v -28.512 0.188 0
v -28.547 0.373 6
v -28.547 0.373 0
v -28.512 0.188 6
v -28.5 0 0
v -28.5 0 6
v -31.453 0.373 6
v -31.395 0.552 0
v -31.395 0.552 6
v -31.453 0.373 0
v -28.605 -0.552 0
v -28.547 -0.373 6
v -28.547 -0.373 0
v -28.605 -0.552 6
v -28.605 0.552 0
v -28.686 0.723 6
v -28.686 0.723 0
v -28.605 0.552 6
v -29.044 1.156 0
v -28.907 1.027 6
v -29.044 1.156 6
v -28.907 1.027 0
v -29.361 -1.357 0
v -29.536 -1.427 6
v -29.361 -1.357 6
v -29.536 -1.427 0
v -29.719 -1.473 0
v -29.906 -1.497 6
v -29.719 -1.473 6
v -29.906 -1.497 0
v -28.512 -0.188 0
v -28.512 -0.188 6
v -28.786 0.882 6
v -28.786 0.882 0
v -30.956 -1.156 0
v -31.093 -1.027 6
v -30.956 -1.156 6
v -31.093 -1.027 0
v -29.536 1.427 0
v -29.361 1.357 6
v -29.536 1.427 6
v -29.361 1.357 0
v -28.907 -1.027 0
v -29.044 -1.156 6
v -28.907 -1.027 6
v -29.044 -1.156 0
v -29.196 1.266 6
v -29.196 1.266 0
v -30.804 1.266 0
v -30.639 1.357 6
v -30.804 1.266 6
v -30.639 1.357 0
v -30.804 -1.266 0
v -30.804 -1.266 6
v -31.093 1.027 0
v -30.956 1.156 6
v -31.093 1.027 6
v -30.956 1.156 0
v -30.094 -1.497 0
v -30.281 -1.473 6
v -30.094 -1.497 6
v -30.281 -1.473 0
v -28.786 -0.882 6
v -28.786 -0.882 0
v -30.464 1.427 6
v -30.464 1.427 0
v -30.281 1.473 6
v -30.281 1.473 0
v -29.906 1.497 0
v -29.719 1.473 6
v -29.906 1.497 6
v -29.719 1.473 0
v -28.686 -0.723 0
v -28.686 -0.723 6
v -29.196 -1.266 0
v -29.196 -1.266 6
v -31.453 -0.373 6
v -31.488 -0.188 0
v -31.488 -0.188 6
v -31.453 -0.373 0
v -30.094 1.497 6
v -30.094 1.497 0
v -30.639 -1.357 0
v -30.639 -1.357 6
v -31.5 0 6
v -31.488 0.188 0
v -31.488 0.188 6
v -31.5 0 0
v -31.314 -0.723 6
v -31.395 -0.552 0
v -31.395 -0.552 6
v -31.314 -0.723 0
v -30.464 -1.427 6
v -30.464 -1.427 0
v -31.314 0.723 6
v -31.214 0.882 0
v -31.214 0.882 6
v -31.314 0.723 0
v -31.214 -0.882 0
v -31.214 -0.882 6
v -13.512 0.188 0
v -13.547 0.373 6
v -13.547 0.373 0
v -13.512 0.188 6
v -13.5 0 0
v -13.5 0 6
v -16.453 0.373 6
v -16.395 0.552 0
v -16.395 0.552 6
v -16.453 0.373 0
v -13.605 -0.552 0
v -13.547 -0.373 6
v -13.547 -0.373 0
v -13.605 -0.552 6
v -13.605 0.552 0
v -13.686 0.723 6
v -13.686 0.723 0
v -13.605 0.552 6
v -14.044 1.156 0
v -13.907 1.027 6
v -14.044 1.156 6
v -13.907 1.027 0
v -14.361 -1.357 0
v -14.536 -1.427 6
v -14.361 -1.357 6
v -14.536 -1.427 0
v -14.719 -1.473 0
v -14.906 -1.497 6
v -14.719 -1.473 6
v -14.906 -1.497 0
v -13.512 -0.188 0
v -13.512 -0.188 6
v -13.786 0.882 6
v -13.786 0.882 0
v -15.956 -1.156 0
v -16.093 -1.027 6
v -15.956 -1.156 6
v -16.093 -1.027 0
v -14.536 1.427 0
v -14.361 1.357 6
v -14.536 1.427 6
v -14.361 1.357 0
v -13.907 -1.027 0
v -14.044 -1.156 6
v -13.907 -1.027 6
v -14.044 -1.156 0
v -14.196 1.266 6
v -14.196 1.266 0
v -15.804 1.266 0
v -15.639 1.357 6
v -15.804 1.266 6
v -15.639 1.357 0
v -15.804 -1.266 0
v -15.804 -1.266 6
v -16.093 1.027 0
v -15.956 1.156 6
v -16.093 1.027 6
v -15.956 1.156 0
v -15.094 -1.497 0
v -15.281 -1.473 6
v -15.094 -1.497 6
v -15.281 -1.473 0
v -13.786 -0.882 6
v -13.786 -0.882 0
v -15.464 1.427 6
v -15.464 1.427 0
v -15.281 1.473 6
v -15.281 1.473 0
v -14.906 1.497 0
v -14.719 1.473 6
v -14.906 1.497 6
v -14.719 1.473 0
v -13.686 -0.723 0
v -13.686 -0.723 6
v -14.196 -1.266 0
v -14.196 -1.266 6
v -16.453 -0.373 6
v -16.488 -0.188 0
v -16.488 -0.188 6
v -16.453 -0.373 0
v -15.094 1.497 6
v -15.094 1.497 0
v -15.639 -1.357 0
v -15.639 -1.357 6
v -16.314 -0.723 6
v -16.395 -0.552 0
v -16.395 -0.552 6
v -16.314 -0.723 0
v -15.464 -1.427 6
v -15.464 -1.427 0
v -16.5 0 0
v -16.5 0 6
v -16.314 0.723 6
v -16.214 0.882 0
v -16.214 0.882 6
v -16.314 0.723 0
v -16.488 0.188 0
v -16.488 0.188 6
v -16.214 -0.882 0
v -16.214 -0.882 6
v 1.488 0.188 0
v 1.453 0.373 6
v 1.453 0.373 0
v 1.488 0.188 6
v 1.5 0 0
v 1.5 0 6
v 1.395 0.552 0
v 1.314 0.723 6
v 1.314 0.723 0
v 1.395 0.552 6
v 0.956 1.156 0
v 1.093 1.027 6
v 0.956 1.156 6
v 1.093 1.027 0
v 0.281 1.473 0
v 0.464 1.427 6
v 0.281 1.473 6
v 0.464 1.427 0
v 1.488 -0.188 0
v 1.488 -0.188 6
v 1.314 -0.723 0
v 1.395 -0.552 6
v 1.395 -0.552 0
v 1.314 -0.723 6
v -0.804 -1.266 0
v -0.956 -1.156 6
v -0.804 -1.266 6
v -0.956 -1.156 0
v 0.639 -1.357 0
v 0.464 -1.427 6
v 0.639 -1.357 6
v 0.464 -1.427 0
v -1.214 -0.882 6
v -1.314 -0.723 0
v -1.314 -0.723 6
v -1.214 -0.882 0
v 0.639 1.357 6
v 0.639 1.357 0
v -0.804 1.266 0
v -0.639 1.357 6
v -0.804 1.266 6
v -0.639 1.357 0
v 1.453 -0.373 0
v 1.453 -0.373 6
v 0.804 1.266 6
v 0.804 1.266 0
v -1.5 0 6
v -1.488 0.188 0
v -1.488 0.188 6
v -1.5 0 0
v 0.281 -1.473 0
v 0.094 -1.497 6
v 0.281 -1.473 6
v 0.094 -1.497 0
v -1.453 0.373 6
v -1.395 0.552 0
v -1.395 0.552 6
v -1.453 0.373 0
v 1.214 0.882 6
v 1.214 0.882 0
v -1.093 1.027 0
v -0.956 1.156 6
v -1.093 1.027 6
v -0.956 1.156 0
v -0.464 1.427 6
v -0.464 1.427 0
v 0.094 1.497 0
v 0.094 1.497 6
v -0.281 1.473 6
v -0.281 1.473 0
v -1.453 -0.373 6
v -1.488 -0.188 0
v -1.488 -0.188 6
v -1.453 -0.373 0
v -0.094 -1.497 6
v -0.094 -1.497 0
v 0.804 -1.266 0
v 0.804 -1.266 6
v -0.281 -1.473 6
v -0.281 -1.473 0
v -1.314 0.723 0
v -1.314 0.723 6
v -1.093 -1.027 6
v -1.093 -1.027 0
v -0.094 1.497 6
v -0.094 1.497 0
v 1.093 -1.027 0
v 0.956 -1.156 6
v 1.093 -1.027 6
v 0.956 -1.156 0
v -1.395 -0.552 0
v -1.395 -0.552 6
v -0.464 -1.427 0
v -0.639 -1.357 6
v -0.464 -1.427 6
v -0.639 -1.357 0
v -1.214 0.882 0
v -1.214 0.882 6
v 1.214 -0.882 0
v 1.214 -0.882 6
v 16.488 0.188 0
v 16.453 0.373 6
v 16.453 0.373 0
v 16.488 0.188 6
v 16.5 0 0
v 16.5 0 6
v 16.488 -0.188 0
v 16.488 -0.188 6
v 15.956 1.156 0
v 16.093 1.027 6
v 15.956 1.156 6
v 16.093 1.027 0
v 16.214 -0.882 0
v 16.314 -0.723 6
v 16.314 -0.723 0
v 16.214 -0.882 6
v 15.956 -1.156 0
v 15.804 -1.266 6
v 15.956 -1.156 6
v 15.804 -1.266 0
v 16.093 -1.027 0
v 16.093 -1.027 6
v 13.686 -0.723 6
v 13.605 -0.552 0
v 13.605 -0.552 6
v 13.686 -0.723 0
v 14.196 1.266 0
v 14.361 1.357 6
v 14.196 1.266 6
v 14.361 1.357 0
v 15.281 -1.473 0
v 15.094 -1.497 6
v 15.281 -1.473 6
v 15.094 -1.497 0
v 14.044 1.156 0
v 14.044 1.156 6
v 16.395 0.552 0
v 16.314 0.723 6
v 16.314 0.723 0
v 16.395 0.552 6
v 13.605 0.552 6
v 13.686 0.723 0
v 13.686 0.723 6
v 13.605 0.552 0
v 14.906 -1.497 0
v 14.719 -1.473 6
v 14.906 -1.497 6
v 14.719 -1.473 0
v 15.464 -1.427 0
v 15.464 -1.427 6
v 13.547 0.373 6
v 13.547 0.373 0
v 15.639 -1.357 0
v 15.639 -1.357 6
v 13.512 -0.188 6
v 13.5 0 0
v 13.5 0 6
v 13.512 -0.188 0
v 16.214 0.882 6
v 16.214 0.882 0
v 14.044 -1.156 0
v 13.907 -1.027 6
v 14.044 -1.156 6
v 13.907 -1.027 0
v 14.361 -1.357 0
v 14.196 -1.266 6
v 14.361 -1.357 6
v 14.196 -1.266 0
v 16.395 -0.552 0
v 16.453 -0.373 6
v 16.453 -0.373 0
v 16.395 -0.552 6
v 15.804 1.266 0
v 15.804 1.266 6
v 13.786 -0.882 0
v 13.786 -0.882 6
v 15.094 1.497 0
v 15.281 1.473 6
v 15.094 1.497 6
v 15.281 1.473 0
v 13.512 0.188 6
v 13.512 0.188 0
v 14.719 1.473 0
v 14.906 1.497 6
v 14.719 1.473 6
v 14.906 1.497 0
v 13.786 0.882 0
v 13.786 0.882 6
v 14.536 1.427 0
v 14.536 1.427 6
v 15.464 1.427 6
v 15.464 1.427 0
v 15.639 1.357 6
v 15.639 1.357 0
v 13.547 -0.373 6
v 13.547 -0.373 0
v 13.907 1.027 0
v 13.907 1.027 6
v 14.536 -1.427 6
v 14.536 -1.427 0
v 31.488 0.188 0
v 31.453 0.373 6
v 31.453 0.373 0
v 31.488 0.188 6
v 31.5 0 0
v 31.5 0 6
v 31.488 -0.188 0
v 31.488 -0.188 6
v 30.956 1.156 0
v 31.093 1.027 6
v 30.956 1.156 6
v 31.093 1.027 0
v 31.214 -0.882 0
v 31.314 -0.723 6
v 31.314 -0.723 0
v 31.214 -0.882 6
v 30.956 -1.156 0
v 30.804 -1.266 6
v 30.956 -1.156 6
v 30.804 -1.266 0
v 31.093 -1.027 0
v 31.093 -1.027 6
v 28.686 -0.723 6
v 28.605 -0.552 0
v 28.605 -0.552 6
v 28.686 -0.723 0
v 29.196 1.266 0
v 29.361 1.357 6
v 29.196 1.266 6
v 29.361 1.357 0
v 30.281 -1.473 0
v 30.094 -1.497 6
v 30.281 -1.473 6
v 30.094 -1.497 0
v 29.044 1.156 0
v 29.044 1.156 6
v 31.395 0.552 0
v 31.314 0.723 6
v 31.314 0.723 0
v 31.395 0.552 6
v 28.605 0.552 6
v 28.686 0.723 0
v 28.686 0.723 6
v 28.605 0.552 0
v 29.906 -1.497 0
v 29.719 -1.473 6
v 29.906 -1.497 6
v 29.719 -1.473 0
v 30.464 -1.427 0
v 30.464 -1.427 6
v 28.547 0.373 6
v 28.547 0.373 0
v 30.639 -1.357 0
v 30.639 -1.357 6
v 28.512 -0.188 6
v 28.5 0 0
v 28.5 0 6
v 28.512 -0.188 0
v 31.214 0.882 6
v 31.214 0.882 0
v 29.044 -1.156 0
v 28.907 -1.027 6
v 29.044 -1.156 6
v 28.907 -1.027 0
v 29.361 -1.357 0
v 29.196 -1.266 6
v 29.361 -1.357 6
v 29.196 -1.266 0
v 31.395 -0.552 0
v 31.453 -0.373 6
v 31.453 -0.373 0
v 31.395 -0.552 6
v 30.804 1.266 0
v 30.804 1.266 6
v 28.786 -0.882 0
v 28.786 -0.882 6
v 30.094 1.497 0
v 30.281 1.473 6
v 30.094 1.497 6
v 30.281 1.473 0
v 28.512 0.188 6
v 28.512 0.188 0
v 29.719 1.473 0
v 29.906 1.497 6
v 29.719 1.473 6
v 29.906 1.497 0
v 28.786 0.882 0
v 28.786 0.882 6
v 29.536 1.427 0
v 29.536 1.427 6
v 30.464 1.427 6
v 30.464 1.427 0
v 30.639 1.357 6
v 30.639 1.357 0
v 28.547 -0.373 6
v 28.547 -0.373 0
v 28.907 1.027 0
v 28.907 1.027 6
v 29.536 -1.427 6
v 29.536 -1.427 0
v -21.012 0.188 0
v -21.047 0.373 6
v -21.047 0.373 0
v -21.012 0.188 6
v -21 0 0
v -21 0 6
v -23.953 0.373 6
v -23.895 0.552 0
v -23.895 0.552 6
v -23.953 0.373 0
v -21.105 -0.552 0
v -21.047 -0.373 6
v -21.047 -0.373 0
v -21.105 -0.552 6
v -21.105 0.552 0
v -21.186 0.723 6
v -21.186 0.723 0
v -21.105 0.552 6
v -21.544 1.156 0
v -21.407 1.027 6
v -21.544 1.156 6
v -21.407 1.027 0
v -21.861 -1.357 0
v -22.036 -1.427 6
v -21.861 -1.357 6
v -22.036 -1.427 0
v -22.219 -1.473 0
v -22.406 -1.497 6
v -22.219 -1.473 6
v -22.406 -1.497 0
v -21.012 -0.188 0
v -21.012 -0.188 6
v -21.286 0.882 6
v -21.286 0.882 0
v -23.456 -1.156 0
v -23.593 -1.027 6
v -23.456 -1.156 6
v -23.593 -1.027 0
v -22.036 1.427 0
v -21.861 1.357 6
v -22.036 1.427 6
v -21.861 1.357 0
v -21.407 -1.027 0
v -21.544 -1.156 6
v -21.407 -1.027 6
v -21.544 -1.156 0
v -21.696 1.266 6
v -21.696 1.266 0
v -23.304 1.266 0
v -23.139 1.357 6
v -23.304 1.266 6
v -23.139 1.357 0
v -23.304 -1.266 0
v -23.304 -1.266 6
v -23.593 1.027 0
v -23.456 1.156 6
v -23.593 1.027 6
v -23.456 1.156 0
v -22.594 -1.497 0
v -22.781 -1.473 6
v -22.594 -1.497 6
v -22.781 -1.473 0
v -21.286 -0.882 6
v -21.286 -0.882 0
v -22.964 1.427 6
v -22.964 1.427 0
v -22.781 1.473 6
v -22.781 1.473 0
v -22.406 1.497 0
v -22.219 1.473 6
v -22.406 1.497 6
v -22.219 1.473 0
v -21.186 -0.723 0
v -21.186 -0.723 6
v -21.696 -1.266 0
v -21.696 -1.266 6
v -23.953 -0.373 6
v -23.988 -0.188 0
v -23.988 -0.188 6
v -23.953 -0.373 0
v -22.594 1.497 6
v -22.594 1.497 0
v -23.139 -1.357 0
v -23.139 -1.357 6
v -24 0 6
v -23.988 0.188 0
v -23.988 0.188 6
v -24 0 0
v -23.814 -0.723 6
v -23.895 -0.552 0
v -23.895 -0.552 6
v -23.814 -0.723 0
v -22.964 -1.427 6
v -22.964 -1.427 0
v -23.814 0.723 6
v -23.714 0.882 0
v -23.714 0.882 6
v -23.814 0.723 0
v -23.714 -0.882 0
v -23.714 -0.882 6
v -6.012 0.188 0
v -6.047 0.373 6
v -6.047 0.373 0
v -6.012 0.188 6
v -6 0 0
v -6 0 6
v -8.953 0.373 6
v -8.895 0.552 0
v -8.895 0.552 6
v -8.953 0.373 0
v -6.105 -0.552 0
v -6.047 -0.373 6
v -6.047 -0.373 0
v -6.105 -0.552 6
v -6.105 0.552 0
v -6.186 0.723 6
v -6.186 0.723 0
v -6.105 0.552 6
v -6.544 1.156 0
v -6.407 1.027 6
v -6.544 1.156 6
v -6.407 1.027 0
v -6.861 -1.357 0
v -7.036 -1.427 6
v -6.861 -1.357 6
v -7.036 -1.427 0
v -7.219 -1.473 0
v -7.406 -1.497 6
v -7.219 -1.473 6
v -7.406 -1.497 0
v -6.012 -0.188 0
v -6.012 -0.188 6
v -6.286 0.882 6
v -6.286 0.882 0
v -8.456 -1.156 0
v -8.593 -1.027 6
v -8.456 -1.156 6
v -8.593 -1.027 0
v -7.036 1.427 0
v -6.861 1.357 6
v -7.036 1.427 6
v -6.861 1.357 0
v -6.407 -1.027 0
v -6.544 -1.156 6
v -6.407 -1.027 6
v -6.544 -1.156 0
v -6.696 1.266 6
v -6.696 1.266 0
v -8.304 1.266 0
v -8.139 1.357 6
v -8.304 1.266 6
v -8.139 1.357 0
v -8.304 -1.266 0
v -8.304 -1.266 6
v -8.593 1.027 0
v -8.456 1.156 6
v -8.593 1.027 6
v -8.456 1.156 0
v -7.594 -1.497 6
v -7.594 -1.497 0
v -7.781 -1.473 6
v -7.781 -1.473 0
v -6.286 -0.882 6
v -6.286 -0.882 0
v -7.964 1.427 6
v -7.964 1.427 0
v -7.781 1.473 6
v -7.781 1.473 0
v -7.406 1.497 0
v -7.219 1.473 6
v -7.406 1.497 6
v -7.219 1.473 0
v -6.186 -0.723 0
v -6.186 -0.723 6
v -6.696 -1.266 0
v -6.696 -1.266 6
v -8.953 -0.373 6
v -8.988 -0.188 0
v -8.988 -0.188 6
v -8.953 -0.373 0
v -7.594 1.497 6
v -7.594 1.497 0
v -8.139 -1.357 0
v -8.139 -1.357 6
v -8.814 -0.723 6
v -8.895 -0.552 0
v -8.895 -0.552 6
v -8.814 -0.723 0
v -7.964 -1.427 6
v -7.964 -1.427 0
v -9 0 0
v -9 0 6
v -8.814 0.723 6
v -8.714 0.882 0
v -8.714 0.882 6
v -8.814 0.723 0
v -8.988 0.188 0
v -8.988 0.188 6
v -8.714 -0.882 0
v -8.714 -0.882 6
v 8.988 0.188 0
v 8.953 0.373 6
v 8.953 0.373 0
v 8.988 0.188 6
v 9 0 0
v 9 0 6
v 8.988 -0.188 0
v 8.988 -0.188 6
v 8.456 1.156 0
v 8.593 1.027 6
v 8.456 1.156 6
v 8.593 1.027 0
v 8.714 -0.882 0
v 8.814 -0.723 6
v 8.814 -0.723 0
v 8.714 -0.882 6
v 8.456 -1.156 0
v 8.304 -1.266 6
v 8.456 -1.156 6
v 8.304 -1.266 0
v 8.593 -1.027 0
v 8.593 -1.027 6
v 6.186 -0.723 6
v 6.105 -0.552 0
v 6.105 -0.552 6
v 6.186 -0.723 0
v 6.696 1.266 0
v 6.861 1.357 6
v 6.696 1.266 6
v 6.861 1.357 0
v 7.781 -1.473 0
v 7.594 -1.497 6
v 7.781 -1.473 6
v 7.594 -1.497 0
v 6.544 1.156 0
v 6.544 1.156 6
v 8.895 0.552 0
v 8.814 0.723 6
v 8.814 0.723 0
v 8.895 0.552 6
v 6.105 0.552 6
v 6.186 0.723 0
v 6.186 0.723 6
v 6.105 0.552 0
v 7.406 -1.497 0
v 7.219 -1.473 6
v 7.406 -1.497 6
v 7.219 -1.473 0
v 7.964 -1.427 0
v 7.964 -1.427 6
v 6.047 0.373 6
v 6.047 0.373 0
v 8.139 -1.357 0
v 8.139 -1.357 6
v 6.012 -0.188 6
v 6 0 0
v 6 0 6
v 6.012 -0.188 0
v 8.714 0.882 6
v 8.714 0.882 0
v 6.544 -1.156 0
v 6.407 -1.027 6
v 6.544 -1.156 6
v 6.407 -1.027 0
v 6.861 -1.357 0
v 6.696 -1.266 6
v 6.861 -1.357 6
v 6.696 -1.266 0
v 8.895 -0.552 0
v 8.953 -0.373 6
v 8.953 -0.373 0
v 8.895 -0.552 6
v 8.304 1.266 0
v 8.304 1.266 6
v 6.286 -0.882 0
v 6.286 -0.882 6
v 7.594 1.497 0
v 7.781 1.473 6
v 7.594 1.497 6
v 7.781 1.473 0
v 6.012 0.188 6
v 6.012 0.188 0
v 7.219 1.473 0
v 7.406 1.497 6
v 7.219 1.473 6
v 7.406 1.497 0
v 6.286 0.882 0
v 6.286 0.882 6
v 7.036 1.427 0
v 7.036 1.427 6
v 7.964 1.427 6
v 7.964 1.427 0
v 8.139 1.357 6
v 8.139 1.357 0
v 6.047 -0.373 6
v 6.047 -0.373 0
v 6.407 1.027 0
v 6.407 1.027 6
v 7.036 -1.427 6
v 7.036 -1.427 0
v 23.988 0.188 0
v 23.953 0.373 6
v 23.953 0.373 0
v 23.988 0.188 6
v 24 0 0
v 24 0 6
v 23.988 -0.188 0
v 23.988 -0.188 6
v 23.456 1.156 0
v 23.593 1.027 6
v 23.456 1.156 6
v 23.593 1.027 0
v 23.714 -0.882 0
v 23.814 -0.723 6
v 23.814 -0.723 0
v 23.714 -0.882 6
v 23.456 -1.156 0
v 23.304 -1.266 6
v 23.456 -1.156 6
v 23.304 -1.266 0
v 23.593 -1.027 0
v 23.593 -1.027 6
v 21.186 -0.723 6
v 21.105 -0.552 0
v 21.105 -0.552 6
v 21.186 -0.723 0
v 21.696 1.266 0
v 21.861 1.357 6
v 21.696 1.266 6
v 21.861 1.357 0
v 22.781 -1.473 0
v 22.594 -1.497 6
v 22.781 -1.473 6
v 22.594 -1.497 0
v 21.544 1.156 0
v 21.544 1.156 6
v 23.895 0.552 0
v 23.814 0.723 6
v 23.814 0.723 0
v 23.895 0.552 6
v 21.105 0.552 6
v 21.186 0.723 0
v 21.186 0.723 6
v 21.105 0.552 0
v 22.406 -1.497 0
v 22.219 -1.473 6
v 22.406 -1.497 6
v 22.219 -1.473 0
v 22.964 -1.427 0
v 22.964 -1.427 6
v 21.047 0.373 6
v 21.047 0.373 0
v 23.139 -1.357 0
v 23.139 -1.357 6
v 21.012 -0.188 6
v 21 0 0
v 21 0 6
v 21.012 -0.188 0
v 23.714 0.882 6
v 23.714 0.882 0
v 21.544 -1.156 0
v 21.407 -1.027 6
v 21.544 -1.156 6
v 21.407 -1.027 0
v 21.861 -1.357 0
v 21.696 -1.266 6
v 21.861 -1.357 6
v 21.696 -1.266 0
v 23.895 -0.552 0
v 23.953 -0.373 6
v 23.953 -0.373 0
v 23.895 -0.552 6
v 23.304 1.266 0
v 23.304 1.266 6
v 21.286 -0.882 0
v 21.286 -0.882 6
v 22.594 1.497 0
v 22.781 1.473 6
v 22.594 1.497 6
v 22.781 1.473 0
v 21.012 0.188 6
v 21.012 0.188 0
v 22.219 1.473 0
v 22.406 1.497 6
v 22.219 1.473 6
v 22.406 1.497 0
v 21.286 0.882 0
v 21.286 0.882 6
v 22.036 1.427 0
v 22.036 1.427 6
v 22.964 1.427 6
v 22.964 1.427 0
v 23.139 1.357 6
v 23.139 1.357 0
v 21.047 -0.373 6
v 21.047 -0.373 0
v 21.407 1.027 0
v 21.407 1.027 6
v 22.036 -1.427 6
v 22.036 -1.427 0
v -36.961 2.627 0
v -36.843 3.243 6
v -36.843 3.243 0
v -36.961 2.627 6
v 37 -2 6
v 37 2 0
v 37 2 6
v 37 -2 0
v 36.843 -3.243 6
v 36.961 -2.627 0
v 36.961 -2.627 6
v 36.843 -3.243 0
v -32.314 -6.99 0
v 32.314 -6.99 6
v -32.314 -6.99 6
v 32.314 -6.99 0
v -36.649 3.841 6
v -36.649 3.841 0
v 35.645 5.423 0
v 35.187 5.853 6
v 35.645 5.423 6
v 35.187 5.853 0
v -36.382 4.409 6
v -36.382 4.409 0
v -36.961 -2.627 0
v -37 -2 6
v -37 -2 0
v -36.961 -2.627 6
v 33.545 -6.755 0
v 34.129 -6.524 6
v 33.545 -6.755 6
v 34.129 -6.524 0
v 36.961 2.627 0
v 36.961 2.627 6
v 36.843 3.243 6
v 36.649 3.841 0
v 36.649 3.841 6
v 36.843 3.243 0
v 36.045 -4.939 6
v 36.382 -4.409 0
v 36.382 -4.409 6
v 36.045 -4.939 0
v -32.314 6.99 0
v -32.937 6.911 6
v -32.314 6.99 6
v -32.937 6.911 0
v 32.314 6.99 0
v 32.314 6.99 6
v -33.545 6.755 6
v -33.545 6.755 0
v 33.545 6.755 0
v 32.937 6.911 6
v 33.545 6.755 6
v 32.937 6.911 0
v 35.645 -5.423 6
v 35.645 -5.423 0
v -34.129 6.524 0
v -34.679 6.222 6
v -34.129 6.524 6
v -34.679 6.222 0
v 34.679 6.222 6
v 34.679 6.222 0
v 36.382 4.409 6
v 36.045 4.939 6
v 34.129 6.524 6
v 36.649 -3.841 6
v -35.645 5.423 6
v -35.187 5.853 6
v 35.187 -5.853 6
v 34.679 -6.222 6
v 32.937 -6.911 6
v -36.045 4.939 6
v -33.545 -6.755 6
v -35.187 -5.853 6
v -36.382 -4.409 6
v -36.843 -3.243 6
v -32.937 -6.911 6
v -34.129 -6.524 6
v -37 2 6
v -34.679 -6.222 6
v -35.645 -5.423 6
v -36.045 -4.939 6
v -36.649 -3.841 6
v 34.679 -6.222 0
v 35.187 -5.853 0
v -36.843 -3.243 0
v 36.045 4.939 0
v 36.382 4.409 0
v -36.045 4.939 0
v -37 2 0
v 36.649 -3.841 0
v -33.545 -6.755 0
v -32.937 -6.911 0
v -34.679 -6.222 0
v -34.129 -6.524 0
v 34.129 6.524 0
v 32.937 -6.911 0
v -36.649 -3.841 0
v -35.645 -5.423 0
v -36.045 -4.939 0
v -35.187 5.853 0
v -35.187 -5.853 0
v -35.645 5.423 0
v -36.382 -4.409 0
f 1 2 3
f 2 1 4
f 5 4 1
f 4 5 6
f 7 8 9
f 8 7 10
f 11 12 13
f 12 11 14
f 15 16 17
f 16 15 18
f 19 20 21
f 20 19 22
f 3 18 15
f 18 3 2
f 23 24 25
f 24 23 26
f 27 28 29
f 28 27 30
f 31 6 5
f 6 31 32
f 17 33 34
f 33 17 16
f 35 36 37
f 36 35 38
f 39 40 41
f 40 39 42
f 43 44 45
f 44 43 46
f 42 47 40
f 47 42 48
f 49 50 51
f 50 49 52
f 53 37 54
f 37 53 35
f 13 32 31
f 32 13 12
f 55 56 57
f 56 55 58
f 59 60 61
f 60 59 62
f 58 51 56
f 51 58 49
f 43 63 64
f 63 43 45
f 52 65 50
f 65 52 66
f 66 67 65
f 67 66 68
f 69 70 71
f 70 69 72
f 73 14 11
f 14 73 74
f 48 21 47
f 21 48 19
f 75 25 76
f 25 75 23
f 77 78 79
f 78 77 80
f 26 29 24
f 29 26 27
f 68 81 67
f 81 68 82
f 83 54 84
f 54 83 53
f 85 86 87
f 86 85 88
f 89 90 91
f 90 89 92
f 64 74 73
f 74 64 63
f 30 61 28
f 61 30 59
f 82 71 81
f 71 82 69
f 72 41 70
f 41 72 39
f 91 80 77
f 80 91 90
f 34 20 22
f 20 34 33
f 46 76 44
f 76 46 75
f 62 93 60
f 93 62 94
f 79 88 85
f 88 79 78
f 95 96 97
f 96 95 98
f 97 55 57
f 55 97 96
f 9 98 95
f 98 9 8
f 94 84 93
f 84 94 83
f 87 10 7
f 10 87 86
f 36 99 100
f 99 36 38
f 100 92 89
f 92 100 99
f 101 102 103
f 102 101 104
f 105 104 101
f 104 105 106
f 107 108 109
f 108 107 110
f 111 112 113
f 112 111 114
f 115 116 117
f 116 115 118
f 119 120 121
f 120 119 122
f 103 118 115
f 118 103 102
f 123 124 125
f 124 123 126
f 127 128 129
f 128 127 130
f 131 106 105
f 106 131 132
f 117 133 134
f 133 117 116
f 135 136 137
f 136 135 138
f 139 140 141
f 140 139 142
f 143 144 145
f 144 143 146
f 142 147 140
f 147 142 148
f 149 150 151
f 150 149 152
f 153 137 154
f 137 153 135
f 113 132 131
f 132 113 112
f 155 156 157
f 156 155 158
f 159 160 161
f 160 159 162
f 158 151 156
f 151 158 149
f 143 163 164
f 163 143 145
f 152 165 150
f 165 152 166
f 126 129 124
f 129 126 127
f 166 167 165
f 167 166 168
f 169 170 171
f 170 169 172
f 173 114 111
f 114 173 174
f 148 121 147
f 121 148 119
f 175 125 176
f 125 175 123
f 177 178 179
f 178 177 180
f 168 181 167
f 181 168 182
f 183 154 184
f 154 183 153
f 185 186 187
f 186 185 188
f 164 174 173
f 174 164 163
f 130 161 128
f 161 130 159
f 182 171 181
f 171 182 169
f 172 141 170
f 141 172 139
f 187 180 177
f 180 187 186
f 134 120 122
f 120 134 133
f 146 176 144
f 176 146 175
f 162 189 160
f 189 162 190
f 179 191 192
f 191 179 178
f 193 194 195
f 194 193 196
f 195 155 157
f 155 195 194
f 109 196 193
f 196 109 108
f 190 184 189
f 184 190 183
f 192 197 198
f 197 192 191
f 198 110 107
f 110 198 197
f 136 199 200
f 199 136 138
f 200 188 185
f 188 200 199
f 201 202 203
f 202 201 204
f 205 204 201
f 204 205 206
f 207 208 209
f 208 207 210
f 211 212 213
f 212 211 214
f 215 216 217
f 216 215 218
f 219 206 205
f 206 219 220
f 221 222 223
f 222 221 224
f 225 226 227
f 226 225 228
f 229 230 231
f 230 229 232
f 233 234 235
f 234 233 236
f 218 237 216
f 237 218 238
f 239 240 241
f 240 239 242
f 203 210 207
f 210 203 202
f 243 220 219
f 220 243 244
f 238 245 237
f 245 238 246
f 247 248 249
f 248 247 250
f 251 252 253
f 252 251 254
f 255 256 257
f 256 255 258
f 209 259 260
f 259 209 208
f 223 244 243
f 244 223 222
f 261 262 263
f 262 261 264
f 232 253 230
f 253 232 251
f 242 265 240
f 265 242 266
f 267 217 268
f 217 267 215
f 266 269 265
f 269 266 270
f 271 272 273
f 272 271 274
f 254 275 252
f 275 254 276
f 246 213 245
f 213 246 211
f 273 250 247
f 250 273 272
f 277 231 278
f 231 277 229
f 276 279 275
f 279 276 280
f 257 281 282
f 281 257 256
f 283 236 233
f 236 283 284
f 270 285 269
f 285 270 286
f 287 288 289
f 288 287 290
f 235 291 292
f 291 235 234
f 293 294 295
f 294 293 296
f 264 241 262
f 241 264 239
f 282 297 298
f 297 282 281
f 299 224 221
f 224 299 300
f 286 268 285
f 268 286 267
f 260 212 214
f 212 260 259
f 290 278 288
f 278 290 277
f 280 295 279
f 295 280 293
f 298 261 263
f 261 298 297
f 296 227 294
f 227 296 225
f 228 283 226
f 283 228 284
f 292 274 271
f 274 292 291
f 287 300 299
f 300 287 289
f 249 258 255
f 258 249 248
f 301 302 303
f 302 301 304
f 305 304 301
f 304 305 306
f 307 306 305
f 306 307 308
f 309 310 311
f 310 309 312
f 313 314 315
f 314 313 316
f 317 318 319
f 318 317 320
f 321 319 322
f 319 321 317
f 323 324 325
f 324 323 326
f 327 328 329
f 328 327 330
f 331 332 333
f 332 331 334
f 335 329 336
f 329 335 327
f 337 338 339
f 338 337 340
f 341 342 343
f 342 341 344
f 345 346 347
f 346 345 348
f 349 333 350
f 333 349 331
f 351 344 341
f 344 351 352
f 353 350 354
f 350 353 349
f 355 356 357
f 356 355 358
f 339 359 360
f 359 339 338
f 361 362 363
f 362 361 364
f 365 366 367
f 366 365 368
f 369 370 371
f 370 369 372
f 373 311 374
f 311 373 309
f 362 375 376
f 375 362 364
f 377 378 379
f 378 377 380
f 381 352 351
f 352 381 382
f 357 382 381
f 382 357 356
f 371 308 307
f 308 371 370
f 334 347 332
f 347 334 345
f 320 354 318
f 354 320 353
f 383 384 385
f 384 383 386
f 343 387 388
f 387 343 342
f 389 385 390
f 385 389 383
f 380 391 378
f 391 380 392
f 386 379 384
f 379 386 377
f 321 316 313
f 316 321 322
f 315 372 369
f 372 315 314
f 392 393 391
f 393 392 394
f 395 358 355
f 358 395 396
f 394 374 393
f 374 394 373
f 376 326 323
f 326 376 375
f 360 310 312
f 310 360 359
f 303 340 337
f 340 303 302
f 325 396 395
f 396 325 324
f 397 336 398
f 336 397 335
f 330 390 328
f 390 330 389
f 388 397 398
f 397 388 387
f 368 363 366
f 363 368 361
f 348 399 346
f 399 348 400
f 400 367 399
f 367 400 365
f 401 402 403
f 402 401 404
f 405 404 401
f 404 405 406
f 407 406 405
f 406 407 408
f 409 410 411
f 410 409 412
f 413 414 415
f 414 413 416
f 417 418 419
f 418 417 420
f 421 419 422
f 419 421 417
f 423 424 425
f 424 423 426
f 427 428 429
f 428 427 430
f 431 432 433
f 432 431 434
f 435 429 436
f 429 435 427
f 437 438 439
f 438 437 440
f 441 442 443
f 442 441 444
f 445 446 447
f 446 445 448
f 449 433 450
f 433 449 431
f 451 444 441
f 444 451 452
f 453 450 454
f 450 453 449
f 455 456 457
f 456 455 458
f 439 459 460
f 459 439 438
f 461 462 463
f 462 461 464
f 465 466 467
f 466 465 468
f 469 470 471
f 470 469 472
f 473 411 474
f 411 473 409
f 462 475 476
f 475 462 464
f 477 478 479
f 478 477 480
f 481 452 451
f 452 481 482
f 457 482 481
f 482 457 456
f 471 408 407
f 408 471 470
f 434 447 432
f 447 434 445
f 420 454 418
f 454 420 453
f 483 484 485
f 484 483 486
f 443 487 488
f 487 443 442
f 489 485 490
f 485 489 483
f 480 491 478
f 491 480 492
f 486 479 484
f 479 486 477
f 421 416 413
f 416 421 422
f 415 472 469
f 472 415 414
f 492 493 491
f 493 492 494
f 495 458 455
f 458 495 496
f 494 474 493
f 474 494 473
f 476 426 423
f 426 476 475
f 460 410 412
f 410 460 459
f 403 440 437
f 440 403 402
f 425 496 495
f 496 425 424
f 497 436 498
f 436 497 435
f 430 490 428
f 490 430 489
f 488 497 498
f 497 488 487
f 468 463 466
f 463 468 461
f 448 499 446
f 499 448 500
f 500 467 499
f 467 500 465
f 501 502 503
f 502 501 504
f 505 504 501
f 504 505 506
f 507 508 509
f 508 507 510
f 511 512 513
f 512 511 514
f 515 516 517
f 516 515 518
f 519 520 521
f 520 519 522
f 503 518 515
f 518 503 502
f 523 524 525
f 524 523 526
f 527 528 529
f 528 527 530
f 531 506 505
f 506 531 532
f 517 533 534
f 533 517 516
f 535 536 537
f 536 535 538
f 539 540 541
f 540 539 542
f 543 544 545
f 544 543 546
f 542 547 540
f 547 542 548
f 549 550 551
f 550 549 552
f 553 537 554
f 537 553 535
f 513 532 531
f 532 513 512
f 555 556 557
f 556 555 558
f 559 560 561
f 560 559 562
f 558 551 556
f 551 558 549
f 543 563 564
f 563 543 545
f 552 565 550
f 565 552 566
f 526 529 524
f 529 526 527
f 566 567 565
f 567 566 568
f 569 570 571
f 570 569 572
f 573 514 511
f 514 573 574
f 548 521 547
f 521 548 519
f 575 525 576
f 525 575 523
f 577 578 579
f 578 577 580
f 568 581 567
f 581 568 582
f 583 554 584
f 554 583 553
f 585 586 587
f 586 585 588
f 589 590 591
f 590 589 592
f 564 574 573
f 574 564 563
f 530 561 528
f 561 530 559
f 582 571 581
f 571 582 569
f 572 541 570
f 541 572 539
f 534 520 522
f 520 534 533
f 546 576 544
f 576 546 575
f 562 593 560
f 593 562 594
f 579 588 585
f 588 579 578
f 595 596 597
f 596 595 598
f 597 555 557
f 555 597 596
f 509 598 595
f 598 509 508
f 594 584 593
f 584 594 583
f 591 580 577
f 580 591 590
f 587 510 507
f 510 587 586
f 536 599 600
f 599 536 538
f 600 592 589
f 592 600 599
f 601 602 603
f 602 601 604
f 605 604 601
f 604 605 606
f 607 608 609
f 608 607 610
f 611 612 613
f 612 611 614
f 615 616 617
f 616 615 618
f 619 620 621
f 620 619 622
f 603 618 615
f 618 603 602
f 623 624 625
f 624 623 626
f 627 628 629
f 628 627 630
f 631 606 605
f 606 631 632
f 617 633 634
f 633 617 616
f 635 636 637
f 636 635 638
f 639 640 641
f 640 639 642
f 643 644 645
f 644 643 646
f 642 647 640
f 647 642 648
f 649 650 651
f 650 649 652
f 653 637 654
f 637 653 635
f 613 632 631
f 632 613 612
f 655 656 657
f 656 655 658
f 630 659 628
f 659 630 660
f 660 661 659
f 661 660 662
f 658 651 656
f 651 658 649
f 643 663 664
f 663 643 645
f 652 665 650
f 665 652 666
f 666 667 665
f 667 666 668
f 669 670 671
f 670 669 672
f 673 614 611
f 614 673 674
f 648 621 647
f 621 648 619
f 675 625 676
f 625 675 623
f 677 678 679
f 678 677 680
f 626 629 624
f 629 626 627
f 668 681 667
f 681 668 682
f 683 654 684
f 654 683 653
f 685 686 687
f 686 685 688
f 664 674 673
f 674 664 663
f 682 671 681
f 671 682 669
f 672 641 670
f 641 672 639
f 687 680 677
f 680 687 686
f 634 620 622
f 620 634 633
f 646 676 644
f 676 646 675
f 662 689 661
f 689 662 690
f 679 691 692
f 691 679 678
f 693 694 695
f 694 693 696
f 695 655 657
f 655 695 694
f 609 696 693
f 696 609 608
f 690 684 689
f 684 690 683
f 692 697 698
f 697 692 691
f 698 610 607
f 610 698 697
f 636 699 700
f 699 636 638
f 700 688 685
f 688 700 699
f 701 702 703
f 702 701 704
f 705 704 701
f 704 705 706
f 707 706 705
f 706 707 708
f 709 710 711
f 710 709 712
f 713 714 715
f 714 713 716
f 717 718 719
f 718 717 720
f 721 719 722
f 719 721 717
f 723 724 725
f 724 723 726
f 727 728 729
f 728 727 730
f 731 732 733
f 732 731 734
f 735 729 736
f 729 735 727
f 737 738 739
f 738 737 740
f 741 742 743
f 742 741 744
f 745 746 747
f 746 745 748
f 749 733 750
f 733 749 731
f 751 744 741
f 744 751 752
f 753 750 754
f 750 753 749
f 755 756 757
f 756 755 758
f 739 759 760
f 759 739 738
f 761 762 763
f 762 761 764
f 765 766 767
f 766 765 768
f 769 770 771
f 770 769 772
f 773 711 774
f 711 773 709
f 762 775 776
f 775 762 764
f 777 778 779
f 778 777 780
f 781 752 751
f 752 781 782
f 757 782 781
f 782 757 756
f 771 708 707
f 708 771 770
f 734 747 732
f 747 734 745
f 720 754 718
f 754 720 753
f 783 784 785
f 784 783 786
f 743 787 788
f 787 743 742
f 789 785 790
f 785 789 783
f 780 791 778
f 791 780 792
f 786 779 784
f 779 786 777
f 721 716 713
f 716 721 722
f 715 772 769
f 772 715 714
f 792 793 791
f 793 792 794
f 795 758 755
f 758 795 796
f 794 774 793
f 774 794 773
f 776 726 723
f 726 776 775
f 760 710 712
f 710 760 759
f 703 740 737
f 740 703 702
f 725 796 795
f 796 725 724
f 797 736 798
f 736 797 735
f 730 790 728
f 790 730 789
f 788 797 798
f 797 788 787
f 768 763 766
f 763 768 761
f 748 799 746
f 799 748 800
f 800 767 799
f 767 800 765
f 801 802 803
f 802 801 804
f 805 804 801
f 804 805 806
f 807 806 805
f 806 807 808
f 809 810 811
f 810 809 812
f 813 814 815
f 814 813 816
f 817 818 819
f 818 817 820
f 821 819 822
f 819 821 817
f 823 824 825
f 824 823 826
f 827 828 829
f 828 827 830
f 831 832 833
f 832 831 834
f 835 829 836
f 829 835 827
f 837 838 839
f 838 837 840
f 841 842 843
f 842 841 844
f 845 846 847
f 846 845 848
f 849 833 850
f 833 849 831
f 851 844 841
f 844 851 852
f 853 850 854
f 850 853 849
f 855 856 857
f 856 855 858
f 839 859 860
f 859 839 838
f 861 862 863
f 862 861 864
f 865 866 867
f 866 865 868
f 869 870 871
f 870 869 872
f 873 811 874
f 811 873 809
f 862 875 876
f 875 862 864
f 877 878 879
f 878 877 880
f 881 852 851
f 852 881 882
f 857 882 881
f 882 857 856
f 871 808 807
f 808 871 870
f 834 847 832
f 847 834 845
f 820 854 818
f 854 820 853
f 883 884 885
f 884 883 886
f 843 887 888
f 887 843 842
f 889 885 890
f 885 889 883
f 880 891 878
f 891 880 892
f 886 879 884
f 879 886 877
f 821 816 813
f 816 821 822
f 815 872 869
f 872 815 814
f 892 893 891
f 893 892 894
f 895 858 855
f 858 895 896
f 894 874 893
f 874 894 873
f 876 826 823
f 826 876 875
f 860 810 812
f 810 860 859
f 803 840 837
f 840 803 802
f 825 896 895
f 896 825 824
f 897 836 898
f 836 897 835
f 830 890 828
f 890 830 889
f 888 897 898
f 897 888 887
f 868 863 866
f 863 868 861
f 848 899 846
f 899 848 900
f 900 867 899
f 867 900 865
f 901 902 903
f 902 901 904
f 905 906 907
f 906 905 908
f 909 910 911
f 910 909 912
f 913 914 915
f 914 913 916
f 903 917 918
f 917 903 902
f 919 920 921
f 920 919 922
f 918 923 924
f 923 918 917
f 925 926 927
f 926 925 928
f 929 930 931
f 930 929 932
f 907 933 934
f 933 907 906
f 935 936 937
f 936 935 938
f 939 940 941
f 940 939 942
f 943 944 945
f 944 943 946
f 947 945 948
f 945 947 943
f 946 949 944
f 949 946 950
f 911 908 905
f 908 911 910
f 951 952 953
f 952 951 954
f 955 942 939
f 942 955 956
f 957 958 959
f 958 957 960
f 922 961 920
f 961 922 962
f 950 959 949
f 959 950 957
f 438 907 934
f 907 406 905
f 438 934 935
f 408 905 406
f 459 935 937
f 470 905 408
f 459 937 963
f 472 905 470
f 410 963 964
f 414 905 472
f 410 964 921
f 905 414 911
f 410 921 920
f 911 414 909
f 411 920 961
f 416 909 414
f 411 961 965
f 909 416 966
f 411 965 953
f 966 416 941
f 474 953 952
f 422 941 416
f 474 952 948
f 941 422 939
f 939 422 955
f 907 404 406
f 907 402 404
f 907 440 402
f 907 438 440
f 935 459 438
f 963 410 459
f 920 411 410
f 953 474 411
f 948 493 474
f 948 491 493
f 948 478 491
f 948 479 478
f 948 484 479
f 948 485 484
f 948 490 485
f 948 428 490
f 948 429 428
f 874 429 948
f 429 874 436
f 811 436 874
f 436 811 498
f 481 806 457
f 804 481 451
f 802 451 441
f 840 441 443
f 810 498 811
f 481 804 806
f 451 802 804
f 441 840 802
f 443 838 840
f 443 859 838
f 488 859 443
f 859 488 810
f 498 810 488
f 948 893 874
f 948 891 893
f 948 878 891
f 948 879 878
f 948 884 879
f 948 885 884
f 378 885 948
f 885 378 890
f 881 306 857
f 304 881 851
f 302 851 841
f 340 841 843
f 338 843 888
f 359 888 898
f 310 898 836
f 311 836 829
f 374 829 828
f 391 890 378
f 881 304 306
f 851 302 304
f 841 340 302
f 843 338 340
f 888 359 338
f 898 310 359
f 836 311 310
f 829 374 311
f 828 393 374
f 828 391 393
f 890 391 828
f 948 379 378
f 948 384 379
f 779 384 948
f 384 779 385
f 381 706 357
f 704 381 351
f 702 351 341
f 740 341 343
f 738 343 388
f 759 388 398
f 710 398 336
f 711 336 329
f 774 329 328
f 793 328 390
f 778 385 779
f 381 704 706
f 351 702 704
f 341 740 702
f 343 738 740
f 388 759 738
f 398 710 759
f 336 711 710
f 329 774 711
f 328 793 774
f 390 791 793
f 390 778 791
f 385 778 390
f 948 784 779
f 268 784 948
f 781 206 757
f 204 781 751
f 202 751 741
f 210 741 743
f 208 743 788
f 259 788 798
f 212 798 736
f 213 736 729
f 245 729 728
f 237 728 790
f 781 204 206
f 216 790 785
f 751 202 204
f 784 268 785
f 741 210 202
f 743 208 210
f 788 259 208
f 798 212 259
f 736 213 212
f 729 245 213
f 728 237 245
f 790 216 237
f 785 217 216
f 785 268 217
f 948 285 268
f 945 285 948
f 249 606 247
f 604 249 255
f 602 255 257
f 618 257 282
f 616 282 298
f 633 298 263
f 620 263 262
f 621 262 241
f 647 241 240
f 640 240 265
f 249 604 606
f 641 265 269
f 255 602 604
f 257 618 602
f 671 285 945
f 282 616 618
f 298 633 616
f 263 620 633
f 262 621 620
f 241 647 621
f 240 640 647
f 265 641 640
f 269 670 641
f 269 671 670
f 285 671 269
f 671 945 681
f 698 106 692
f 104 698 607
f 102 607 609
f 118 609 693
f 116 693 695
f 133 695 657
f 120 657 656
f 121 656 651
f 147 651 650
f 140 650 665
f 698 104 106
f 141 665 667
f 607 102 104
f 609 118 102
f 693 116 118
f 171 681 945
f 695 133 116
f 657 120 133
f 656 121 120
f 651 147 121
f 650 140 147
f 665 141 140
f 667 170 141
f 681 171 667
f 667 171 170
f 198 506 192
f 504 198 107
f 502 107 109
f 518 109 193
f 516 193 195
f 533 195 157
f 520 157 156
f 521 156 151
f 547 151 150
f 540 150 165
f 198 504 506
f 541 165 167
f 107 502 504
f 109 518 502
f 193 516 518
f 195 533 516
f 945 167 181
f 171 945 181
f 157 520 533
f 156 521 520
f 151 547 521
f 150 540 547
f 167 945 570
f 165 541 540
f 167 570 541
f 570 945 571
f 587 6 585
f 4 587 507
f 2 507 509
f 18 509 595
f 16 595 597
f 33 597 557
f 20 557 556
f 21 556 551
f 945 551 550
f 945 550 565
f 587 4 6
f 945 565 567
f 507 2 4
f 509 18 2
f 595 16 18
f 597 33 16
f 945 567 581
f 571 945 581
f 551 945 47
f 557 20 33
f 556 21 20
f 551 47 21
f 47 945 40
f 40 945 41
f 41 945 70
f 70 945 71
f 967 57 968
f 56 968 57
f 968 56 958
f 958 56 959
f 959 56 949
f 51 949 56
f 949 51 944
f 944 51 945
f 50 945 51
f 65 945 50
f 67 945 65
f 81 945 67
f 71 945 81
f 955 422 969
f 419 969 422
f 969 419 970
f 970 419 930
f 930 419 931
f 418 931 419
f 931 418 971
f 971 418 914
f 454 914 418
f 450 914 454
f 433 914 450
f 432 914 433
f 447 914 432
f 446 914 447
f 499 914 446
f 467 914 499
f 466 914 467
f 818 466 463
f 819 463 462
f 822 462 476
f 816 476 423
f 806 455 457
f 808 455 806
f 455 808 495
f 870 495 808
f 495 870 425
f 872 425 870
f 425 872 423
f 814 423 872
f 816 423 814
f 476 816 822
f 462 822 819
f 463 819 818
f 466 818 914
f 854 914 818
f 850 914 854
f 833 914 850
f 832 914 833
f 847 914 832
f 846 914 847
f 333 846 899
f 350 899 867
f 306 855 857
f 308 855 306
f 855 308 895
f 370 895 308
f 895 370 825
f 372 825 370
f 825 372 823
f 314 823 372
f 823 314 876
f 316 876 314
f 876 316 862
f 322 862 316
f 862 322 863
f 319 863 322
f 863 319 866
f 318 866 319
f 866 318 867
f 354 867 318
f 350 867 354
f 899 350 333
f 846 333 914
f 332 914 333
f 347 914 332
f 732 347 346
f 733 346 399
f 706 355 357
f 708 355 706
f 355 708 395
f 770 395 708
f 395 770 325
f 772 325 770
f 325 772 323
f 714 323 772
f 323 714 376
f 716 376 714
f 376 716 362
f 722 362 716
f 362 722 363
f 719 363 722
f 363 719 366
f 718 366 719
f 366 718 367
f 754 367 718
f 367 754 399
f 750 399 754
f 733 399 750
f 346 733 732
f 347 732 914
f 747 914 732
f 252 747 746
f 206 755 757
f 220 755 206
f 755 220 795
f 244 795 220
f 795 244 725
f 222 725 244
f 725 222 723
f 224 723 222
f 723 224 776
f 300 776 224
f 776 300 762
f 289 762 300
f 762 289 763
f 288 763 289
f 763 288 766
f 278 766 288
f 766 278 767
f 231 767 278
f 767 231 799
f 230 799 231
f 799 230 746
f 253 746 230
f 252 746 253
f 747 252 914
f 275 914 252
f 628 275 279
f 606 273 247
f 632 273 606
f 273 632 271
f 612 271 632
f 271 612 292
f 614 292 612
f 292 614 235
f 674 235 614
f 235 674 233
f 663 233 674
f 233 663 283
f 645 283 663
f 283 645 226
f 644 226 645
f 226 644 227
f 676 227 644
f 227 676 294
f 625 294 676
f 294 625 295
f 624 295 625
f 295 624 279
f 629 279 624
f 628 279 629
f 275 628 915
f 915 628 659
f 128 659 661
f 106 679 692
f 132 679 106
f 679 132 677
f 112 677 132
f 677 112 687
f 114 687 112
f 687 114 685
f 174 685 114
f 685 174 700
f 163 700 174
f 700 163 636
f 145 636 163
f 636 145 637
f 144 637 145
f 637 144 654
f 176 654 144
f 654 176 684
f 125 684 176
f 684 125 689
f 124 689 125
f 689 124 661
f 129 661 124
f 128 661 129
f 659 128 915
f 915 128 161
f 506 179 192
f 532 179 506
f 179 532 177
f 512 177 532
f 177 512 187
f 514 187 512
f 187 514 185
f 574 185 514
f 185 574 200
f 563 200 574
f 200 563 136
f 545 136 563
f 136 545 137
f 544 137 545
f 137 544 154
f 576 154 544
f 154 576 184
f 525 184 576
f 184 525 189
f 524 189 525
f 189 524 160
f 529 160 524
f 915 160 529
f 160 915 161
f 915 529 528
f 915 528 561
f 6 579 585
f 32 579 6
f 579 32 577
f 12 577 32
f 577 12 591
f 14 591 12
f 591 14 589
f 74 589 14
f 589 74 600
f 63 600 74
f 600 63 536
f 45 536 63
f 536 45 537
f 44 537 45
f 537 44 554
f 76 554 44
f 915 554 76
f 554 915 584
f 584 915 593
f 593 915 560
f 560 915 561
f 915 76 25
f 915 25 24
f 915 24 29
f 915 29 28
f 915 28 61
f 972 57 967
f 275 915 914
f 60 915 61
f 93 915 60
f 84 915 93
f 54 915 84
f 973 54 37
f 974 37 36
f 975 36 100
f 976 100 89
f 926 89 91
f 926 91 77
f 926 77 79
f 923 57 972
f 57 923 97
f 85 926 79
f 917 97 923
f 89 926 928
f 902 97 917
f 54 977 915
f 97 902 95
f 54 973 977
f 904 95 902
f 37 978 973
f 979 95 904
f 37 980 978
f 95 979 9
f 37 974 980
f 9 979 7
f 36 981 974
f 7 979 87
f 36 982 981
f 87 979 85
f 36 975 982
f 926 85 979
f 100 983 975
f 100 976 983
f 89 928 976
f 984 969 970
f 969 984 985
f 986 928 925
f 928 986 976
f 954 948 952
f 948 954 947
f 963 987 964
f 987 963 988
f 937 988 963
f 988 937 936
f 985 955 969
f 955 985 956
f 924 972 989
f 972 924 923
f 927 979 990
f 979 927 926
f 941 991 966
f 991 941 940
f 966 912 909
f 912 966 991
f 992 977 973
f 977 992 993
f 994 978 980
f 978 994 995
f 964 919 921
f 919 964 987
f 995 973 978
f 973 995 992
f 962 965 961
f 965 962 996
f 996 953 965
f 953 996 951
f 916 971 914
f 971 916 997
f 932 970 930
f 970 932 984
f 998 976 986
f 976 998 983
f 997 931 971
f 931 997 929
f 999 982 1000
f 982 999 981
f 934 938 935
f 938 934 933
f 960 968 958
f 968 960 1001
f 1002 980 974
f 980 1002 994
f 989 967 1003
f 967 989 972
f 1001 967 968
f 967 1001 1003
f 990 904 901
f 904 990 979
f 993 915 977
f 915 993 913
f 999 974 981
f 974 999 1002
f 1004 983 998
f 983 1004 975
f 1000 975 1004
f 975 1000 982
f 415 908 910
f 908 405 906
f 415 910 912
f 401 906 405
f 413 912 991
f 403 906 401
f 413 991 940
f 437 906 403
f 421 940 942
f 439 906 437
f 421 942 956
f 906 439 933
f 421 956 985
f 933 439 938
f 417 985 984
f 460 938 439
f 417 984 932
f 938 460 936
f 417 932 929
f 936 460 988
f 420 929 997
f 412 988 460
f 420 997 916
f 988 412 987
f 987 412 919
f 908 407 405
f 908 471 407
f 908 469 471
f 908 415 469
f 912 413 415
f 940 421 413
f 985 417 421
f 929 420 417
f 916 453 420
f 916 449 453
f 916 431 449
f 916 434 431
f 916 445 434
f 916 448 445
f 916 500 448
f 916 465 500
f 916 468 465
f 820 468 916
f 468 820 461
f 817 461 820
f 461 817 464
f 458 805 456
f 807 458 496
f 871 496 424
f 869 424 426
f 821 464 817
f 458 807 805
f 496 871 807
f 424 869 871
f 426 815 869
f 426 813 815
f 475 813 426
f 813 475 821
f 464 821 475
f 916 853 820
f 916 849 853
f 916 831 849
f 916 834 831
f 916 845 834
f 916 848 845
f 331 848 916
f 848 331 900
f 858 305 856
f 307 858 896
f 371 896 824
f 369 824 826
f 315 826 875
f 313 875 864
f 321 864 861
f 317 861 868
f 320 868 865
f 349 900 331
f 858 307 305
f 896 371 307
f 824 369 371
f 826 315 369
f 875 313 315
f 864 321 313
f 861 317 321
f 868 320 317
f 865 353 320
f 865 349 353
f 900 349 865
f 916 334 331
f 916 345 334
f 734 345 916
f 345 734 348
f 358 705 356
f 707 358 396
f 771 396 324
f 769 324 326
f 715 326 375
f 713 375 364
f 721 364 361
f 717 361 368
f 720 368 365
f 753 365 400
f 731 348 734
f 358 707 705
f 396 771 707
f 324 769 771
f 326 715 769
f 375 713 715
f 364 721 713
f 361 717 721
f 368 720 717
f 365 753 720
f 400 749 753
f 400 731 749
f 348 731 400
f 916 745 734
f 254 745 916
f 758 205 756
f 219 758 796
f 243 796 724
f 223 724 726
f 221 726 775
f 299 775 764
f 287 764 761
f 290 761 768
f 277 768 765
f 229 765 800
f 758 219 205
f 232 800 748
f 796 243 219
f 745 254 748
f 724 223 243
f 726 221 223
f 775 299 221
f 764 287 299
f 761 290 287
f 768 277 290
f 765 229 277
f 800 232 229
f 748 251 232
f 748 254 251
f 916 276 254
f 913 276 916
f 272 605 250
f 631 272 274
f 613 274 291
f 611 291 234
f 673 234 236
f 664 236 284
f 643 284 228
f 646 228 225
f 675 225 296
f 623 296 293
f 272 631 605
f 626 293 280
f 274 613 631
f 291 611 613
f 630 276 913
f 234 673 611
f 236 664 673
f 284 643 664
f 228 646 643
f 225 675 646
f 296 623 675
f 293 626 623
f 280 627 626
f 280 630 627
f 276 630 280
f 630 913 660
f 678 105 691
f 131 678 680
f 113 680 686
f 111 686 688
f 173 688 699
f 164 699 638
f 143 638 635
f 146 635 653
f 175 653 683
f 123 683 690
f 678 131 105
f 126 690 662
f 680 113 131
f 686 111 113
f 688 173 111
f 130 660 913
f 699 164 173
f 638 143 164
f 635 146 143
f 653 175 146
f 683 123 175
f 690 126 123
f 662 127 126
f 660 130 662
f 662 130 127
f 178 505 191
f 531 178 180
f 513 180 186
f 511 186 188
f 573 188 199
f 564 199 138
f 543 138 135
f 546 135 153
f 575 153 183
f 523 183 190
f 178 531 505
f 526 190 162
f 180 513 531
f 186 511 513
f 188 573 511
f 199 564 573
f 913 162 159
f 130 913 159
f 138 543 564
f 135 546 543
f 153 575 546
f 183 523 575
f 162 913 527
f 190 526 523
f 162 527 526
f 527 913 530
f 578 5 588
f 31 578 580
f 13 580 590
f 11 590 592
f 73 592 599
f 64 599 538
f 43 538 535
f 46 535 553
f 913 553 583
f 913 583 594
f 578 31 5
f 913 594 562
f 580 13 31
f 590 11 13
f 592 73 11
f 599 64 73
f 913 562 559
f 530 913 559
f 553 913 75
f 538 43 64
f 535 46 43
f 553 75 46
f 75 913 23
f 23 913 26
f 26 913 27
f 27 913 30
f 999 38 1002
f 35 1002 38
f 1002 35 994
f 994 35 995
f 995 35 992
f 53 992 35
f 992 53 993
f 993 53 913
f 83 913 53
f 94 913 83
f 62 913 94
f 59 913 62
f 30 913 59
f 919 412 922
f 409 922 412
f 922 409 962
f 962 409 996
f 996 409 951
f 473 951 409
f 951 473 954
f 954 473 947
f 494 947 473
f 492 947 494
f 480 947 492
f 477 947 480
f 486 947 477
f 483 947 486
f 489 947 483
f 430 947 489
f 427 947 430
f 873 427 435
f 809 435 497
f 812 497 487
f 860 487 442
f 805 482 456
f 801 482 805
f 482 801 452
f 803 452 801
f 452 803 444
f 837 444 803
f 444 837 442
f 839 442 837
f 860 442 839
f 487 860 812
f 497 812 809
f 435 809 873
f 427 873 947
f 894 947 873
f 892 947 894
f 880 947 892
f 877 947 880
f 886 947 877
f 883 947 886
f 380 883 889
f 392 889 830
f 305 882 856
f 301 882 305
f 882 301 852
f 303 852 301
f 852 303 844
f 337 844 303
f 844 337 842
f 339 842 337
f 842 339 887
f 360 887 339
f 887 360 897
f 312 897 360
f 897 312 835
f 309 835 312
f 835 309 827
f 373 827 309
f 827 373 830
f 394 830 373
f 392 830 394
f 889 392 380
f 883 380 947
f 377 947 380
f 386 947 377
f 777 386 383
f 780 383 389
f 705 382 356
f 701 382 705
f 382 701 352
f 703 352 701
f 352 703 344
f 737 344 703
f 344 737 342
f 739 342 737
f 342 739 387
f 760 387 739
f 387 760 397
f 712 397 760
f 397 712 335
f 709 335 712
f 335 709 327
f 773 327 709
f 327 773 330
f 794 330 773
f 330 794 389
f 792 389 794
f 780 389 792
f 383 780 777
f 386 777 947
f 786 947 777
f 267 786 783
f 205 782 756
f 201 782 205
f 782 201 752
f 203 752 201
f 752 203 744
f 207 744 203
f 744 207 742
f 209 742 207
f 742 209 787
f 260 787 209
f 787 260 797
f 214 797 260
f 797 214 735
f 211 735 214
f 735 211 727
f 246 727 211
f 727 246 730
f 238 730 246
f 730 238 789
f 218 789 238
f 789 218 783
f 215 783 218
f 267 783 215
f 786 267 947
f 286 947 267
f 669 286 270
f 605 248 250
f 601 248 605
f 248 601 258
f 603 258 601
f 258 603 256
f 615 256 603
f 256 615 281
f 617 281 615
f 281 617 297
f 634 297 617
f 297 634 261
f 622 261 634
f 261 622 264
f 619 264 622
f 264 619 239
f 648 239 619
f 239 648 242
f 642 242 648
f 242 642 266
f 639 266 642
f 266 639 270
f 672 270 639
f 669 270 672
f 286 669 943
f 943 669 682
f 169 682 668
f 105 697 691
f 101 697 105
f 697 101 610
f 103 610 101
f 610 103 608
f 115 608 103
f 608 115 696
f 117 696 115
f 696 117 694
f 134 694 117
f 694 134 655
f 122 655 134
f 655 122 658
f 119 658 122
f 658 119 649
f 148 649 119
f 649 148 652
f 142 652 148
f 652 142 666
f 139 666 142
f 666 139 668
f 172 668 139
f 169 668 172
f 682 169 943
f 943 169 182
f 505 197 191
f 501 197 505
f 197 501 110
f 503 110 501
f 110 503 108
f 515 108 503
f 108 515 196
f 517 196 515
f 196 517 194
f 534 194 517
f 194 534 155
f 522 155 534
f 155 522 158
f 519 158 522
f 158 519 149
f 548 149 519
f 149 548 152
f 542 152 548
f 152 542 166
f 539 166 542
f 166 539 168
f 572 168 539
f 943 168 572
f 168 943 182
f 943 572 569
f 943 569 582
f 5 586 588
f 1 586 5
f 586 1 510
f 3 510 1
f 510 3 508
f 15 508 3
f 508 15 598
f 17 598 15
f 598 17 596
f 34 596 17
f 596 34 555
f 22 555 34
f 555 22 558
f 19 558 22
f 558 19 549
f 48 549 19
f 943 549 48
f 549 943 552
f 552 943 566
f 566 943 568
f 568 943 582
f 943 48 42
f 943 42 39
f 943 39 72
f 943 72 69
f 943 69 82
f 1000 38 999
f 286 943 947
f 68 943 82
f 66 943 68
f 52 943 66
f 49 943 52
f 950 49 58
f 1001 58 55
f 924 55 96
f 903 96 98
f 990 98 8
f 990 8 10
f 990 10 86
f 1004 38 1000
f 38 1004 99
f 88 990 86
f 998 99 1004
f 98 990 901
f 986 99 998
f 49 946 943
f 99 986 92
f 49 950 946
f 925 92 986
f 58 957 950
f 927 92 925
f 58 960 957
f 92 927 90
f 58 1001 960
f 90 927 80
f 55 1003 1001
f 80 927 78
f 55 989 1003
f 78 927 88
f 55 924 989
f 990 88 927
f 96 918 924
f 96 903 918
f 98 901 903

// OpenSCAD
$fn = 50;


difference() {
	union() {
		hull() {
			translate(v = [-32.0000000000, 2.0000000000, 0]) {
				cylinder(h = 6, r = 5);
			}
			translate(v = [32.0000000000, 2.0000000000, 0]) {
				cylinder(h = 6, r = 5);
			}
			translate(v = [-32.0000000000, -2.0000000000, 0]) {
				cylinder(h = 6, r = 5);
			}
			translate(v = [32.0000000000, -2.0000000000, 0]) {
				cylinder(h = 6, r = 5);
			}
		}
	}
	union() {
		translate(v = [-30.0000000000, 0.0000000000, 0]) {
			translate(v = [0, 0, -100]) {
				cylinder(h = 200, r = 1.5000000000);
			}
		}
		translate(v = [-15.0000000000, 0.0000000000, 0]) {
			translate(v = [0, 0, -100]) {
				cylinder(h = 200, r = 1.5000000000);
			}
		}
		translate(v = [0, 0, -100]) {
			cylinder(h = 200, r = 1.5000000000);
		}
		translate(v = [15.0000000000, 0.0000000000, 0]) {
			translate(v = [0, 0, -100]) {
				cylinder(h = 200, r = 1.5000000000);
			}
		}
		translate(v = [30.0000000000, 0.0000000000, 0]) {
			translate(v = [0, 0, -100]) {
				cylinder(h = 200, r = 1.5000000000);
			}
		}
		translate(v = [-30.0000000000, 0.0000000000, 0]) {
			translate(v = [0, 0, -100]) {
				cylinder(h = 200, r = 1.5000000000);
			}
		}
		translate(v = [-22.5000000000, 0.0000000000, 0]) {
			translate(v = [0, 0, -100]) {
				cylinder(h = 200, r = 1.5000000000);
			}
		}
		translate(v = [-15.0000000000, 0.0000000000, 0]) {
			translate(v = [0, 0, -100]) {
				cylinder(h = 200, r = 1.5000000000);
			}
		}
		translate(v = [-7.5000000000, 0.0000000000, 0]) {
			translate(v = [0, 0, -100]) {
				cylinder(h = 200, r = 1.5000000000);
			}
		}
		translate(v = [0, 0, -100]) {
			cylinder(h = 200, r = 1.5000000000);
		}
		translate(v = [7.5000000000, 0.0000000000, 0]) {
			translate(v = [0, 0, -100]) {
				cylinder(h = 200, r = 1.5000000000);
			}
		}
		translate(v = [15.0000000000, 0.0000000000, 0]) {
			translate(v = [0, 0, -100]) {
				cylinder(h = 200, r = 1.5000000000);
			}
		}
		translate(v = [22.5000000000, 0.0000000000, 0]) {
			translate(v = [0, 0, -100]) {
				cylinder(h = 200, r = 1.5000000000);
			}
		}
		translate(v = [30.0000000000, 0.0000000000, 0]) {
			translate(v = [0, 0, -100]) {
				cylinder(h = 200, r = 1.5000000000);
			}
		}
	}
}
